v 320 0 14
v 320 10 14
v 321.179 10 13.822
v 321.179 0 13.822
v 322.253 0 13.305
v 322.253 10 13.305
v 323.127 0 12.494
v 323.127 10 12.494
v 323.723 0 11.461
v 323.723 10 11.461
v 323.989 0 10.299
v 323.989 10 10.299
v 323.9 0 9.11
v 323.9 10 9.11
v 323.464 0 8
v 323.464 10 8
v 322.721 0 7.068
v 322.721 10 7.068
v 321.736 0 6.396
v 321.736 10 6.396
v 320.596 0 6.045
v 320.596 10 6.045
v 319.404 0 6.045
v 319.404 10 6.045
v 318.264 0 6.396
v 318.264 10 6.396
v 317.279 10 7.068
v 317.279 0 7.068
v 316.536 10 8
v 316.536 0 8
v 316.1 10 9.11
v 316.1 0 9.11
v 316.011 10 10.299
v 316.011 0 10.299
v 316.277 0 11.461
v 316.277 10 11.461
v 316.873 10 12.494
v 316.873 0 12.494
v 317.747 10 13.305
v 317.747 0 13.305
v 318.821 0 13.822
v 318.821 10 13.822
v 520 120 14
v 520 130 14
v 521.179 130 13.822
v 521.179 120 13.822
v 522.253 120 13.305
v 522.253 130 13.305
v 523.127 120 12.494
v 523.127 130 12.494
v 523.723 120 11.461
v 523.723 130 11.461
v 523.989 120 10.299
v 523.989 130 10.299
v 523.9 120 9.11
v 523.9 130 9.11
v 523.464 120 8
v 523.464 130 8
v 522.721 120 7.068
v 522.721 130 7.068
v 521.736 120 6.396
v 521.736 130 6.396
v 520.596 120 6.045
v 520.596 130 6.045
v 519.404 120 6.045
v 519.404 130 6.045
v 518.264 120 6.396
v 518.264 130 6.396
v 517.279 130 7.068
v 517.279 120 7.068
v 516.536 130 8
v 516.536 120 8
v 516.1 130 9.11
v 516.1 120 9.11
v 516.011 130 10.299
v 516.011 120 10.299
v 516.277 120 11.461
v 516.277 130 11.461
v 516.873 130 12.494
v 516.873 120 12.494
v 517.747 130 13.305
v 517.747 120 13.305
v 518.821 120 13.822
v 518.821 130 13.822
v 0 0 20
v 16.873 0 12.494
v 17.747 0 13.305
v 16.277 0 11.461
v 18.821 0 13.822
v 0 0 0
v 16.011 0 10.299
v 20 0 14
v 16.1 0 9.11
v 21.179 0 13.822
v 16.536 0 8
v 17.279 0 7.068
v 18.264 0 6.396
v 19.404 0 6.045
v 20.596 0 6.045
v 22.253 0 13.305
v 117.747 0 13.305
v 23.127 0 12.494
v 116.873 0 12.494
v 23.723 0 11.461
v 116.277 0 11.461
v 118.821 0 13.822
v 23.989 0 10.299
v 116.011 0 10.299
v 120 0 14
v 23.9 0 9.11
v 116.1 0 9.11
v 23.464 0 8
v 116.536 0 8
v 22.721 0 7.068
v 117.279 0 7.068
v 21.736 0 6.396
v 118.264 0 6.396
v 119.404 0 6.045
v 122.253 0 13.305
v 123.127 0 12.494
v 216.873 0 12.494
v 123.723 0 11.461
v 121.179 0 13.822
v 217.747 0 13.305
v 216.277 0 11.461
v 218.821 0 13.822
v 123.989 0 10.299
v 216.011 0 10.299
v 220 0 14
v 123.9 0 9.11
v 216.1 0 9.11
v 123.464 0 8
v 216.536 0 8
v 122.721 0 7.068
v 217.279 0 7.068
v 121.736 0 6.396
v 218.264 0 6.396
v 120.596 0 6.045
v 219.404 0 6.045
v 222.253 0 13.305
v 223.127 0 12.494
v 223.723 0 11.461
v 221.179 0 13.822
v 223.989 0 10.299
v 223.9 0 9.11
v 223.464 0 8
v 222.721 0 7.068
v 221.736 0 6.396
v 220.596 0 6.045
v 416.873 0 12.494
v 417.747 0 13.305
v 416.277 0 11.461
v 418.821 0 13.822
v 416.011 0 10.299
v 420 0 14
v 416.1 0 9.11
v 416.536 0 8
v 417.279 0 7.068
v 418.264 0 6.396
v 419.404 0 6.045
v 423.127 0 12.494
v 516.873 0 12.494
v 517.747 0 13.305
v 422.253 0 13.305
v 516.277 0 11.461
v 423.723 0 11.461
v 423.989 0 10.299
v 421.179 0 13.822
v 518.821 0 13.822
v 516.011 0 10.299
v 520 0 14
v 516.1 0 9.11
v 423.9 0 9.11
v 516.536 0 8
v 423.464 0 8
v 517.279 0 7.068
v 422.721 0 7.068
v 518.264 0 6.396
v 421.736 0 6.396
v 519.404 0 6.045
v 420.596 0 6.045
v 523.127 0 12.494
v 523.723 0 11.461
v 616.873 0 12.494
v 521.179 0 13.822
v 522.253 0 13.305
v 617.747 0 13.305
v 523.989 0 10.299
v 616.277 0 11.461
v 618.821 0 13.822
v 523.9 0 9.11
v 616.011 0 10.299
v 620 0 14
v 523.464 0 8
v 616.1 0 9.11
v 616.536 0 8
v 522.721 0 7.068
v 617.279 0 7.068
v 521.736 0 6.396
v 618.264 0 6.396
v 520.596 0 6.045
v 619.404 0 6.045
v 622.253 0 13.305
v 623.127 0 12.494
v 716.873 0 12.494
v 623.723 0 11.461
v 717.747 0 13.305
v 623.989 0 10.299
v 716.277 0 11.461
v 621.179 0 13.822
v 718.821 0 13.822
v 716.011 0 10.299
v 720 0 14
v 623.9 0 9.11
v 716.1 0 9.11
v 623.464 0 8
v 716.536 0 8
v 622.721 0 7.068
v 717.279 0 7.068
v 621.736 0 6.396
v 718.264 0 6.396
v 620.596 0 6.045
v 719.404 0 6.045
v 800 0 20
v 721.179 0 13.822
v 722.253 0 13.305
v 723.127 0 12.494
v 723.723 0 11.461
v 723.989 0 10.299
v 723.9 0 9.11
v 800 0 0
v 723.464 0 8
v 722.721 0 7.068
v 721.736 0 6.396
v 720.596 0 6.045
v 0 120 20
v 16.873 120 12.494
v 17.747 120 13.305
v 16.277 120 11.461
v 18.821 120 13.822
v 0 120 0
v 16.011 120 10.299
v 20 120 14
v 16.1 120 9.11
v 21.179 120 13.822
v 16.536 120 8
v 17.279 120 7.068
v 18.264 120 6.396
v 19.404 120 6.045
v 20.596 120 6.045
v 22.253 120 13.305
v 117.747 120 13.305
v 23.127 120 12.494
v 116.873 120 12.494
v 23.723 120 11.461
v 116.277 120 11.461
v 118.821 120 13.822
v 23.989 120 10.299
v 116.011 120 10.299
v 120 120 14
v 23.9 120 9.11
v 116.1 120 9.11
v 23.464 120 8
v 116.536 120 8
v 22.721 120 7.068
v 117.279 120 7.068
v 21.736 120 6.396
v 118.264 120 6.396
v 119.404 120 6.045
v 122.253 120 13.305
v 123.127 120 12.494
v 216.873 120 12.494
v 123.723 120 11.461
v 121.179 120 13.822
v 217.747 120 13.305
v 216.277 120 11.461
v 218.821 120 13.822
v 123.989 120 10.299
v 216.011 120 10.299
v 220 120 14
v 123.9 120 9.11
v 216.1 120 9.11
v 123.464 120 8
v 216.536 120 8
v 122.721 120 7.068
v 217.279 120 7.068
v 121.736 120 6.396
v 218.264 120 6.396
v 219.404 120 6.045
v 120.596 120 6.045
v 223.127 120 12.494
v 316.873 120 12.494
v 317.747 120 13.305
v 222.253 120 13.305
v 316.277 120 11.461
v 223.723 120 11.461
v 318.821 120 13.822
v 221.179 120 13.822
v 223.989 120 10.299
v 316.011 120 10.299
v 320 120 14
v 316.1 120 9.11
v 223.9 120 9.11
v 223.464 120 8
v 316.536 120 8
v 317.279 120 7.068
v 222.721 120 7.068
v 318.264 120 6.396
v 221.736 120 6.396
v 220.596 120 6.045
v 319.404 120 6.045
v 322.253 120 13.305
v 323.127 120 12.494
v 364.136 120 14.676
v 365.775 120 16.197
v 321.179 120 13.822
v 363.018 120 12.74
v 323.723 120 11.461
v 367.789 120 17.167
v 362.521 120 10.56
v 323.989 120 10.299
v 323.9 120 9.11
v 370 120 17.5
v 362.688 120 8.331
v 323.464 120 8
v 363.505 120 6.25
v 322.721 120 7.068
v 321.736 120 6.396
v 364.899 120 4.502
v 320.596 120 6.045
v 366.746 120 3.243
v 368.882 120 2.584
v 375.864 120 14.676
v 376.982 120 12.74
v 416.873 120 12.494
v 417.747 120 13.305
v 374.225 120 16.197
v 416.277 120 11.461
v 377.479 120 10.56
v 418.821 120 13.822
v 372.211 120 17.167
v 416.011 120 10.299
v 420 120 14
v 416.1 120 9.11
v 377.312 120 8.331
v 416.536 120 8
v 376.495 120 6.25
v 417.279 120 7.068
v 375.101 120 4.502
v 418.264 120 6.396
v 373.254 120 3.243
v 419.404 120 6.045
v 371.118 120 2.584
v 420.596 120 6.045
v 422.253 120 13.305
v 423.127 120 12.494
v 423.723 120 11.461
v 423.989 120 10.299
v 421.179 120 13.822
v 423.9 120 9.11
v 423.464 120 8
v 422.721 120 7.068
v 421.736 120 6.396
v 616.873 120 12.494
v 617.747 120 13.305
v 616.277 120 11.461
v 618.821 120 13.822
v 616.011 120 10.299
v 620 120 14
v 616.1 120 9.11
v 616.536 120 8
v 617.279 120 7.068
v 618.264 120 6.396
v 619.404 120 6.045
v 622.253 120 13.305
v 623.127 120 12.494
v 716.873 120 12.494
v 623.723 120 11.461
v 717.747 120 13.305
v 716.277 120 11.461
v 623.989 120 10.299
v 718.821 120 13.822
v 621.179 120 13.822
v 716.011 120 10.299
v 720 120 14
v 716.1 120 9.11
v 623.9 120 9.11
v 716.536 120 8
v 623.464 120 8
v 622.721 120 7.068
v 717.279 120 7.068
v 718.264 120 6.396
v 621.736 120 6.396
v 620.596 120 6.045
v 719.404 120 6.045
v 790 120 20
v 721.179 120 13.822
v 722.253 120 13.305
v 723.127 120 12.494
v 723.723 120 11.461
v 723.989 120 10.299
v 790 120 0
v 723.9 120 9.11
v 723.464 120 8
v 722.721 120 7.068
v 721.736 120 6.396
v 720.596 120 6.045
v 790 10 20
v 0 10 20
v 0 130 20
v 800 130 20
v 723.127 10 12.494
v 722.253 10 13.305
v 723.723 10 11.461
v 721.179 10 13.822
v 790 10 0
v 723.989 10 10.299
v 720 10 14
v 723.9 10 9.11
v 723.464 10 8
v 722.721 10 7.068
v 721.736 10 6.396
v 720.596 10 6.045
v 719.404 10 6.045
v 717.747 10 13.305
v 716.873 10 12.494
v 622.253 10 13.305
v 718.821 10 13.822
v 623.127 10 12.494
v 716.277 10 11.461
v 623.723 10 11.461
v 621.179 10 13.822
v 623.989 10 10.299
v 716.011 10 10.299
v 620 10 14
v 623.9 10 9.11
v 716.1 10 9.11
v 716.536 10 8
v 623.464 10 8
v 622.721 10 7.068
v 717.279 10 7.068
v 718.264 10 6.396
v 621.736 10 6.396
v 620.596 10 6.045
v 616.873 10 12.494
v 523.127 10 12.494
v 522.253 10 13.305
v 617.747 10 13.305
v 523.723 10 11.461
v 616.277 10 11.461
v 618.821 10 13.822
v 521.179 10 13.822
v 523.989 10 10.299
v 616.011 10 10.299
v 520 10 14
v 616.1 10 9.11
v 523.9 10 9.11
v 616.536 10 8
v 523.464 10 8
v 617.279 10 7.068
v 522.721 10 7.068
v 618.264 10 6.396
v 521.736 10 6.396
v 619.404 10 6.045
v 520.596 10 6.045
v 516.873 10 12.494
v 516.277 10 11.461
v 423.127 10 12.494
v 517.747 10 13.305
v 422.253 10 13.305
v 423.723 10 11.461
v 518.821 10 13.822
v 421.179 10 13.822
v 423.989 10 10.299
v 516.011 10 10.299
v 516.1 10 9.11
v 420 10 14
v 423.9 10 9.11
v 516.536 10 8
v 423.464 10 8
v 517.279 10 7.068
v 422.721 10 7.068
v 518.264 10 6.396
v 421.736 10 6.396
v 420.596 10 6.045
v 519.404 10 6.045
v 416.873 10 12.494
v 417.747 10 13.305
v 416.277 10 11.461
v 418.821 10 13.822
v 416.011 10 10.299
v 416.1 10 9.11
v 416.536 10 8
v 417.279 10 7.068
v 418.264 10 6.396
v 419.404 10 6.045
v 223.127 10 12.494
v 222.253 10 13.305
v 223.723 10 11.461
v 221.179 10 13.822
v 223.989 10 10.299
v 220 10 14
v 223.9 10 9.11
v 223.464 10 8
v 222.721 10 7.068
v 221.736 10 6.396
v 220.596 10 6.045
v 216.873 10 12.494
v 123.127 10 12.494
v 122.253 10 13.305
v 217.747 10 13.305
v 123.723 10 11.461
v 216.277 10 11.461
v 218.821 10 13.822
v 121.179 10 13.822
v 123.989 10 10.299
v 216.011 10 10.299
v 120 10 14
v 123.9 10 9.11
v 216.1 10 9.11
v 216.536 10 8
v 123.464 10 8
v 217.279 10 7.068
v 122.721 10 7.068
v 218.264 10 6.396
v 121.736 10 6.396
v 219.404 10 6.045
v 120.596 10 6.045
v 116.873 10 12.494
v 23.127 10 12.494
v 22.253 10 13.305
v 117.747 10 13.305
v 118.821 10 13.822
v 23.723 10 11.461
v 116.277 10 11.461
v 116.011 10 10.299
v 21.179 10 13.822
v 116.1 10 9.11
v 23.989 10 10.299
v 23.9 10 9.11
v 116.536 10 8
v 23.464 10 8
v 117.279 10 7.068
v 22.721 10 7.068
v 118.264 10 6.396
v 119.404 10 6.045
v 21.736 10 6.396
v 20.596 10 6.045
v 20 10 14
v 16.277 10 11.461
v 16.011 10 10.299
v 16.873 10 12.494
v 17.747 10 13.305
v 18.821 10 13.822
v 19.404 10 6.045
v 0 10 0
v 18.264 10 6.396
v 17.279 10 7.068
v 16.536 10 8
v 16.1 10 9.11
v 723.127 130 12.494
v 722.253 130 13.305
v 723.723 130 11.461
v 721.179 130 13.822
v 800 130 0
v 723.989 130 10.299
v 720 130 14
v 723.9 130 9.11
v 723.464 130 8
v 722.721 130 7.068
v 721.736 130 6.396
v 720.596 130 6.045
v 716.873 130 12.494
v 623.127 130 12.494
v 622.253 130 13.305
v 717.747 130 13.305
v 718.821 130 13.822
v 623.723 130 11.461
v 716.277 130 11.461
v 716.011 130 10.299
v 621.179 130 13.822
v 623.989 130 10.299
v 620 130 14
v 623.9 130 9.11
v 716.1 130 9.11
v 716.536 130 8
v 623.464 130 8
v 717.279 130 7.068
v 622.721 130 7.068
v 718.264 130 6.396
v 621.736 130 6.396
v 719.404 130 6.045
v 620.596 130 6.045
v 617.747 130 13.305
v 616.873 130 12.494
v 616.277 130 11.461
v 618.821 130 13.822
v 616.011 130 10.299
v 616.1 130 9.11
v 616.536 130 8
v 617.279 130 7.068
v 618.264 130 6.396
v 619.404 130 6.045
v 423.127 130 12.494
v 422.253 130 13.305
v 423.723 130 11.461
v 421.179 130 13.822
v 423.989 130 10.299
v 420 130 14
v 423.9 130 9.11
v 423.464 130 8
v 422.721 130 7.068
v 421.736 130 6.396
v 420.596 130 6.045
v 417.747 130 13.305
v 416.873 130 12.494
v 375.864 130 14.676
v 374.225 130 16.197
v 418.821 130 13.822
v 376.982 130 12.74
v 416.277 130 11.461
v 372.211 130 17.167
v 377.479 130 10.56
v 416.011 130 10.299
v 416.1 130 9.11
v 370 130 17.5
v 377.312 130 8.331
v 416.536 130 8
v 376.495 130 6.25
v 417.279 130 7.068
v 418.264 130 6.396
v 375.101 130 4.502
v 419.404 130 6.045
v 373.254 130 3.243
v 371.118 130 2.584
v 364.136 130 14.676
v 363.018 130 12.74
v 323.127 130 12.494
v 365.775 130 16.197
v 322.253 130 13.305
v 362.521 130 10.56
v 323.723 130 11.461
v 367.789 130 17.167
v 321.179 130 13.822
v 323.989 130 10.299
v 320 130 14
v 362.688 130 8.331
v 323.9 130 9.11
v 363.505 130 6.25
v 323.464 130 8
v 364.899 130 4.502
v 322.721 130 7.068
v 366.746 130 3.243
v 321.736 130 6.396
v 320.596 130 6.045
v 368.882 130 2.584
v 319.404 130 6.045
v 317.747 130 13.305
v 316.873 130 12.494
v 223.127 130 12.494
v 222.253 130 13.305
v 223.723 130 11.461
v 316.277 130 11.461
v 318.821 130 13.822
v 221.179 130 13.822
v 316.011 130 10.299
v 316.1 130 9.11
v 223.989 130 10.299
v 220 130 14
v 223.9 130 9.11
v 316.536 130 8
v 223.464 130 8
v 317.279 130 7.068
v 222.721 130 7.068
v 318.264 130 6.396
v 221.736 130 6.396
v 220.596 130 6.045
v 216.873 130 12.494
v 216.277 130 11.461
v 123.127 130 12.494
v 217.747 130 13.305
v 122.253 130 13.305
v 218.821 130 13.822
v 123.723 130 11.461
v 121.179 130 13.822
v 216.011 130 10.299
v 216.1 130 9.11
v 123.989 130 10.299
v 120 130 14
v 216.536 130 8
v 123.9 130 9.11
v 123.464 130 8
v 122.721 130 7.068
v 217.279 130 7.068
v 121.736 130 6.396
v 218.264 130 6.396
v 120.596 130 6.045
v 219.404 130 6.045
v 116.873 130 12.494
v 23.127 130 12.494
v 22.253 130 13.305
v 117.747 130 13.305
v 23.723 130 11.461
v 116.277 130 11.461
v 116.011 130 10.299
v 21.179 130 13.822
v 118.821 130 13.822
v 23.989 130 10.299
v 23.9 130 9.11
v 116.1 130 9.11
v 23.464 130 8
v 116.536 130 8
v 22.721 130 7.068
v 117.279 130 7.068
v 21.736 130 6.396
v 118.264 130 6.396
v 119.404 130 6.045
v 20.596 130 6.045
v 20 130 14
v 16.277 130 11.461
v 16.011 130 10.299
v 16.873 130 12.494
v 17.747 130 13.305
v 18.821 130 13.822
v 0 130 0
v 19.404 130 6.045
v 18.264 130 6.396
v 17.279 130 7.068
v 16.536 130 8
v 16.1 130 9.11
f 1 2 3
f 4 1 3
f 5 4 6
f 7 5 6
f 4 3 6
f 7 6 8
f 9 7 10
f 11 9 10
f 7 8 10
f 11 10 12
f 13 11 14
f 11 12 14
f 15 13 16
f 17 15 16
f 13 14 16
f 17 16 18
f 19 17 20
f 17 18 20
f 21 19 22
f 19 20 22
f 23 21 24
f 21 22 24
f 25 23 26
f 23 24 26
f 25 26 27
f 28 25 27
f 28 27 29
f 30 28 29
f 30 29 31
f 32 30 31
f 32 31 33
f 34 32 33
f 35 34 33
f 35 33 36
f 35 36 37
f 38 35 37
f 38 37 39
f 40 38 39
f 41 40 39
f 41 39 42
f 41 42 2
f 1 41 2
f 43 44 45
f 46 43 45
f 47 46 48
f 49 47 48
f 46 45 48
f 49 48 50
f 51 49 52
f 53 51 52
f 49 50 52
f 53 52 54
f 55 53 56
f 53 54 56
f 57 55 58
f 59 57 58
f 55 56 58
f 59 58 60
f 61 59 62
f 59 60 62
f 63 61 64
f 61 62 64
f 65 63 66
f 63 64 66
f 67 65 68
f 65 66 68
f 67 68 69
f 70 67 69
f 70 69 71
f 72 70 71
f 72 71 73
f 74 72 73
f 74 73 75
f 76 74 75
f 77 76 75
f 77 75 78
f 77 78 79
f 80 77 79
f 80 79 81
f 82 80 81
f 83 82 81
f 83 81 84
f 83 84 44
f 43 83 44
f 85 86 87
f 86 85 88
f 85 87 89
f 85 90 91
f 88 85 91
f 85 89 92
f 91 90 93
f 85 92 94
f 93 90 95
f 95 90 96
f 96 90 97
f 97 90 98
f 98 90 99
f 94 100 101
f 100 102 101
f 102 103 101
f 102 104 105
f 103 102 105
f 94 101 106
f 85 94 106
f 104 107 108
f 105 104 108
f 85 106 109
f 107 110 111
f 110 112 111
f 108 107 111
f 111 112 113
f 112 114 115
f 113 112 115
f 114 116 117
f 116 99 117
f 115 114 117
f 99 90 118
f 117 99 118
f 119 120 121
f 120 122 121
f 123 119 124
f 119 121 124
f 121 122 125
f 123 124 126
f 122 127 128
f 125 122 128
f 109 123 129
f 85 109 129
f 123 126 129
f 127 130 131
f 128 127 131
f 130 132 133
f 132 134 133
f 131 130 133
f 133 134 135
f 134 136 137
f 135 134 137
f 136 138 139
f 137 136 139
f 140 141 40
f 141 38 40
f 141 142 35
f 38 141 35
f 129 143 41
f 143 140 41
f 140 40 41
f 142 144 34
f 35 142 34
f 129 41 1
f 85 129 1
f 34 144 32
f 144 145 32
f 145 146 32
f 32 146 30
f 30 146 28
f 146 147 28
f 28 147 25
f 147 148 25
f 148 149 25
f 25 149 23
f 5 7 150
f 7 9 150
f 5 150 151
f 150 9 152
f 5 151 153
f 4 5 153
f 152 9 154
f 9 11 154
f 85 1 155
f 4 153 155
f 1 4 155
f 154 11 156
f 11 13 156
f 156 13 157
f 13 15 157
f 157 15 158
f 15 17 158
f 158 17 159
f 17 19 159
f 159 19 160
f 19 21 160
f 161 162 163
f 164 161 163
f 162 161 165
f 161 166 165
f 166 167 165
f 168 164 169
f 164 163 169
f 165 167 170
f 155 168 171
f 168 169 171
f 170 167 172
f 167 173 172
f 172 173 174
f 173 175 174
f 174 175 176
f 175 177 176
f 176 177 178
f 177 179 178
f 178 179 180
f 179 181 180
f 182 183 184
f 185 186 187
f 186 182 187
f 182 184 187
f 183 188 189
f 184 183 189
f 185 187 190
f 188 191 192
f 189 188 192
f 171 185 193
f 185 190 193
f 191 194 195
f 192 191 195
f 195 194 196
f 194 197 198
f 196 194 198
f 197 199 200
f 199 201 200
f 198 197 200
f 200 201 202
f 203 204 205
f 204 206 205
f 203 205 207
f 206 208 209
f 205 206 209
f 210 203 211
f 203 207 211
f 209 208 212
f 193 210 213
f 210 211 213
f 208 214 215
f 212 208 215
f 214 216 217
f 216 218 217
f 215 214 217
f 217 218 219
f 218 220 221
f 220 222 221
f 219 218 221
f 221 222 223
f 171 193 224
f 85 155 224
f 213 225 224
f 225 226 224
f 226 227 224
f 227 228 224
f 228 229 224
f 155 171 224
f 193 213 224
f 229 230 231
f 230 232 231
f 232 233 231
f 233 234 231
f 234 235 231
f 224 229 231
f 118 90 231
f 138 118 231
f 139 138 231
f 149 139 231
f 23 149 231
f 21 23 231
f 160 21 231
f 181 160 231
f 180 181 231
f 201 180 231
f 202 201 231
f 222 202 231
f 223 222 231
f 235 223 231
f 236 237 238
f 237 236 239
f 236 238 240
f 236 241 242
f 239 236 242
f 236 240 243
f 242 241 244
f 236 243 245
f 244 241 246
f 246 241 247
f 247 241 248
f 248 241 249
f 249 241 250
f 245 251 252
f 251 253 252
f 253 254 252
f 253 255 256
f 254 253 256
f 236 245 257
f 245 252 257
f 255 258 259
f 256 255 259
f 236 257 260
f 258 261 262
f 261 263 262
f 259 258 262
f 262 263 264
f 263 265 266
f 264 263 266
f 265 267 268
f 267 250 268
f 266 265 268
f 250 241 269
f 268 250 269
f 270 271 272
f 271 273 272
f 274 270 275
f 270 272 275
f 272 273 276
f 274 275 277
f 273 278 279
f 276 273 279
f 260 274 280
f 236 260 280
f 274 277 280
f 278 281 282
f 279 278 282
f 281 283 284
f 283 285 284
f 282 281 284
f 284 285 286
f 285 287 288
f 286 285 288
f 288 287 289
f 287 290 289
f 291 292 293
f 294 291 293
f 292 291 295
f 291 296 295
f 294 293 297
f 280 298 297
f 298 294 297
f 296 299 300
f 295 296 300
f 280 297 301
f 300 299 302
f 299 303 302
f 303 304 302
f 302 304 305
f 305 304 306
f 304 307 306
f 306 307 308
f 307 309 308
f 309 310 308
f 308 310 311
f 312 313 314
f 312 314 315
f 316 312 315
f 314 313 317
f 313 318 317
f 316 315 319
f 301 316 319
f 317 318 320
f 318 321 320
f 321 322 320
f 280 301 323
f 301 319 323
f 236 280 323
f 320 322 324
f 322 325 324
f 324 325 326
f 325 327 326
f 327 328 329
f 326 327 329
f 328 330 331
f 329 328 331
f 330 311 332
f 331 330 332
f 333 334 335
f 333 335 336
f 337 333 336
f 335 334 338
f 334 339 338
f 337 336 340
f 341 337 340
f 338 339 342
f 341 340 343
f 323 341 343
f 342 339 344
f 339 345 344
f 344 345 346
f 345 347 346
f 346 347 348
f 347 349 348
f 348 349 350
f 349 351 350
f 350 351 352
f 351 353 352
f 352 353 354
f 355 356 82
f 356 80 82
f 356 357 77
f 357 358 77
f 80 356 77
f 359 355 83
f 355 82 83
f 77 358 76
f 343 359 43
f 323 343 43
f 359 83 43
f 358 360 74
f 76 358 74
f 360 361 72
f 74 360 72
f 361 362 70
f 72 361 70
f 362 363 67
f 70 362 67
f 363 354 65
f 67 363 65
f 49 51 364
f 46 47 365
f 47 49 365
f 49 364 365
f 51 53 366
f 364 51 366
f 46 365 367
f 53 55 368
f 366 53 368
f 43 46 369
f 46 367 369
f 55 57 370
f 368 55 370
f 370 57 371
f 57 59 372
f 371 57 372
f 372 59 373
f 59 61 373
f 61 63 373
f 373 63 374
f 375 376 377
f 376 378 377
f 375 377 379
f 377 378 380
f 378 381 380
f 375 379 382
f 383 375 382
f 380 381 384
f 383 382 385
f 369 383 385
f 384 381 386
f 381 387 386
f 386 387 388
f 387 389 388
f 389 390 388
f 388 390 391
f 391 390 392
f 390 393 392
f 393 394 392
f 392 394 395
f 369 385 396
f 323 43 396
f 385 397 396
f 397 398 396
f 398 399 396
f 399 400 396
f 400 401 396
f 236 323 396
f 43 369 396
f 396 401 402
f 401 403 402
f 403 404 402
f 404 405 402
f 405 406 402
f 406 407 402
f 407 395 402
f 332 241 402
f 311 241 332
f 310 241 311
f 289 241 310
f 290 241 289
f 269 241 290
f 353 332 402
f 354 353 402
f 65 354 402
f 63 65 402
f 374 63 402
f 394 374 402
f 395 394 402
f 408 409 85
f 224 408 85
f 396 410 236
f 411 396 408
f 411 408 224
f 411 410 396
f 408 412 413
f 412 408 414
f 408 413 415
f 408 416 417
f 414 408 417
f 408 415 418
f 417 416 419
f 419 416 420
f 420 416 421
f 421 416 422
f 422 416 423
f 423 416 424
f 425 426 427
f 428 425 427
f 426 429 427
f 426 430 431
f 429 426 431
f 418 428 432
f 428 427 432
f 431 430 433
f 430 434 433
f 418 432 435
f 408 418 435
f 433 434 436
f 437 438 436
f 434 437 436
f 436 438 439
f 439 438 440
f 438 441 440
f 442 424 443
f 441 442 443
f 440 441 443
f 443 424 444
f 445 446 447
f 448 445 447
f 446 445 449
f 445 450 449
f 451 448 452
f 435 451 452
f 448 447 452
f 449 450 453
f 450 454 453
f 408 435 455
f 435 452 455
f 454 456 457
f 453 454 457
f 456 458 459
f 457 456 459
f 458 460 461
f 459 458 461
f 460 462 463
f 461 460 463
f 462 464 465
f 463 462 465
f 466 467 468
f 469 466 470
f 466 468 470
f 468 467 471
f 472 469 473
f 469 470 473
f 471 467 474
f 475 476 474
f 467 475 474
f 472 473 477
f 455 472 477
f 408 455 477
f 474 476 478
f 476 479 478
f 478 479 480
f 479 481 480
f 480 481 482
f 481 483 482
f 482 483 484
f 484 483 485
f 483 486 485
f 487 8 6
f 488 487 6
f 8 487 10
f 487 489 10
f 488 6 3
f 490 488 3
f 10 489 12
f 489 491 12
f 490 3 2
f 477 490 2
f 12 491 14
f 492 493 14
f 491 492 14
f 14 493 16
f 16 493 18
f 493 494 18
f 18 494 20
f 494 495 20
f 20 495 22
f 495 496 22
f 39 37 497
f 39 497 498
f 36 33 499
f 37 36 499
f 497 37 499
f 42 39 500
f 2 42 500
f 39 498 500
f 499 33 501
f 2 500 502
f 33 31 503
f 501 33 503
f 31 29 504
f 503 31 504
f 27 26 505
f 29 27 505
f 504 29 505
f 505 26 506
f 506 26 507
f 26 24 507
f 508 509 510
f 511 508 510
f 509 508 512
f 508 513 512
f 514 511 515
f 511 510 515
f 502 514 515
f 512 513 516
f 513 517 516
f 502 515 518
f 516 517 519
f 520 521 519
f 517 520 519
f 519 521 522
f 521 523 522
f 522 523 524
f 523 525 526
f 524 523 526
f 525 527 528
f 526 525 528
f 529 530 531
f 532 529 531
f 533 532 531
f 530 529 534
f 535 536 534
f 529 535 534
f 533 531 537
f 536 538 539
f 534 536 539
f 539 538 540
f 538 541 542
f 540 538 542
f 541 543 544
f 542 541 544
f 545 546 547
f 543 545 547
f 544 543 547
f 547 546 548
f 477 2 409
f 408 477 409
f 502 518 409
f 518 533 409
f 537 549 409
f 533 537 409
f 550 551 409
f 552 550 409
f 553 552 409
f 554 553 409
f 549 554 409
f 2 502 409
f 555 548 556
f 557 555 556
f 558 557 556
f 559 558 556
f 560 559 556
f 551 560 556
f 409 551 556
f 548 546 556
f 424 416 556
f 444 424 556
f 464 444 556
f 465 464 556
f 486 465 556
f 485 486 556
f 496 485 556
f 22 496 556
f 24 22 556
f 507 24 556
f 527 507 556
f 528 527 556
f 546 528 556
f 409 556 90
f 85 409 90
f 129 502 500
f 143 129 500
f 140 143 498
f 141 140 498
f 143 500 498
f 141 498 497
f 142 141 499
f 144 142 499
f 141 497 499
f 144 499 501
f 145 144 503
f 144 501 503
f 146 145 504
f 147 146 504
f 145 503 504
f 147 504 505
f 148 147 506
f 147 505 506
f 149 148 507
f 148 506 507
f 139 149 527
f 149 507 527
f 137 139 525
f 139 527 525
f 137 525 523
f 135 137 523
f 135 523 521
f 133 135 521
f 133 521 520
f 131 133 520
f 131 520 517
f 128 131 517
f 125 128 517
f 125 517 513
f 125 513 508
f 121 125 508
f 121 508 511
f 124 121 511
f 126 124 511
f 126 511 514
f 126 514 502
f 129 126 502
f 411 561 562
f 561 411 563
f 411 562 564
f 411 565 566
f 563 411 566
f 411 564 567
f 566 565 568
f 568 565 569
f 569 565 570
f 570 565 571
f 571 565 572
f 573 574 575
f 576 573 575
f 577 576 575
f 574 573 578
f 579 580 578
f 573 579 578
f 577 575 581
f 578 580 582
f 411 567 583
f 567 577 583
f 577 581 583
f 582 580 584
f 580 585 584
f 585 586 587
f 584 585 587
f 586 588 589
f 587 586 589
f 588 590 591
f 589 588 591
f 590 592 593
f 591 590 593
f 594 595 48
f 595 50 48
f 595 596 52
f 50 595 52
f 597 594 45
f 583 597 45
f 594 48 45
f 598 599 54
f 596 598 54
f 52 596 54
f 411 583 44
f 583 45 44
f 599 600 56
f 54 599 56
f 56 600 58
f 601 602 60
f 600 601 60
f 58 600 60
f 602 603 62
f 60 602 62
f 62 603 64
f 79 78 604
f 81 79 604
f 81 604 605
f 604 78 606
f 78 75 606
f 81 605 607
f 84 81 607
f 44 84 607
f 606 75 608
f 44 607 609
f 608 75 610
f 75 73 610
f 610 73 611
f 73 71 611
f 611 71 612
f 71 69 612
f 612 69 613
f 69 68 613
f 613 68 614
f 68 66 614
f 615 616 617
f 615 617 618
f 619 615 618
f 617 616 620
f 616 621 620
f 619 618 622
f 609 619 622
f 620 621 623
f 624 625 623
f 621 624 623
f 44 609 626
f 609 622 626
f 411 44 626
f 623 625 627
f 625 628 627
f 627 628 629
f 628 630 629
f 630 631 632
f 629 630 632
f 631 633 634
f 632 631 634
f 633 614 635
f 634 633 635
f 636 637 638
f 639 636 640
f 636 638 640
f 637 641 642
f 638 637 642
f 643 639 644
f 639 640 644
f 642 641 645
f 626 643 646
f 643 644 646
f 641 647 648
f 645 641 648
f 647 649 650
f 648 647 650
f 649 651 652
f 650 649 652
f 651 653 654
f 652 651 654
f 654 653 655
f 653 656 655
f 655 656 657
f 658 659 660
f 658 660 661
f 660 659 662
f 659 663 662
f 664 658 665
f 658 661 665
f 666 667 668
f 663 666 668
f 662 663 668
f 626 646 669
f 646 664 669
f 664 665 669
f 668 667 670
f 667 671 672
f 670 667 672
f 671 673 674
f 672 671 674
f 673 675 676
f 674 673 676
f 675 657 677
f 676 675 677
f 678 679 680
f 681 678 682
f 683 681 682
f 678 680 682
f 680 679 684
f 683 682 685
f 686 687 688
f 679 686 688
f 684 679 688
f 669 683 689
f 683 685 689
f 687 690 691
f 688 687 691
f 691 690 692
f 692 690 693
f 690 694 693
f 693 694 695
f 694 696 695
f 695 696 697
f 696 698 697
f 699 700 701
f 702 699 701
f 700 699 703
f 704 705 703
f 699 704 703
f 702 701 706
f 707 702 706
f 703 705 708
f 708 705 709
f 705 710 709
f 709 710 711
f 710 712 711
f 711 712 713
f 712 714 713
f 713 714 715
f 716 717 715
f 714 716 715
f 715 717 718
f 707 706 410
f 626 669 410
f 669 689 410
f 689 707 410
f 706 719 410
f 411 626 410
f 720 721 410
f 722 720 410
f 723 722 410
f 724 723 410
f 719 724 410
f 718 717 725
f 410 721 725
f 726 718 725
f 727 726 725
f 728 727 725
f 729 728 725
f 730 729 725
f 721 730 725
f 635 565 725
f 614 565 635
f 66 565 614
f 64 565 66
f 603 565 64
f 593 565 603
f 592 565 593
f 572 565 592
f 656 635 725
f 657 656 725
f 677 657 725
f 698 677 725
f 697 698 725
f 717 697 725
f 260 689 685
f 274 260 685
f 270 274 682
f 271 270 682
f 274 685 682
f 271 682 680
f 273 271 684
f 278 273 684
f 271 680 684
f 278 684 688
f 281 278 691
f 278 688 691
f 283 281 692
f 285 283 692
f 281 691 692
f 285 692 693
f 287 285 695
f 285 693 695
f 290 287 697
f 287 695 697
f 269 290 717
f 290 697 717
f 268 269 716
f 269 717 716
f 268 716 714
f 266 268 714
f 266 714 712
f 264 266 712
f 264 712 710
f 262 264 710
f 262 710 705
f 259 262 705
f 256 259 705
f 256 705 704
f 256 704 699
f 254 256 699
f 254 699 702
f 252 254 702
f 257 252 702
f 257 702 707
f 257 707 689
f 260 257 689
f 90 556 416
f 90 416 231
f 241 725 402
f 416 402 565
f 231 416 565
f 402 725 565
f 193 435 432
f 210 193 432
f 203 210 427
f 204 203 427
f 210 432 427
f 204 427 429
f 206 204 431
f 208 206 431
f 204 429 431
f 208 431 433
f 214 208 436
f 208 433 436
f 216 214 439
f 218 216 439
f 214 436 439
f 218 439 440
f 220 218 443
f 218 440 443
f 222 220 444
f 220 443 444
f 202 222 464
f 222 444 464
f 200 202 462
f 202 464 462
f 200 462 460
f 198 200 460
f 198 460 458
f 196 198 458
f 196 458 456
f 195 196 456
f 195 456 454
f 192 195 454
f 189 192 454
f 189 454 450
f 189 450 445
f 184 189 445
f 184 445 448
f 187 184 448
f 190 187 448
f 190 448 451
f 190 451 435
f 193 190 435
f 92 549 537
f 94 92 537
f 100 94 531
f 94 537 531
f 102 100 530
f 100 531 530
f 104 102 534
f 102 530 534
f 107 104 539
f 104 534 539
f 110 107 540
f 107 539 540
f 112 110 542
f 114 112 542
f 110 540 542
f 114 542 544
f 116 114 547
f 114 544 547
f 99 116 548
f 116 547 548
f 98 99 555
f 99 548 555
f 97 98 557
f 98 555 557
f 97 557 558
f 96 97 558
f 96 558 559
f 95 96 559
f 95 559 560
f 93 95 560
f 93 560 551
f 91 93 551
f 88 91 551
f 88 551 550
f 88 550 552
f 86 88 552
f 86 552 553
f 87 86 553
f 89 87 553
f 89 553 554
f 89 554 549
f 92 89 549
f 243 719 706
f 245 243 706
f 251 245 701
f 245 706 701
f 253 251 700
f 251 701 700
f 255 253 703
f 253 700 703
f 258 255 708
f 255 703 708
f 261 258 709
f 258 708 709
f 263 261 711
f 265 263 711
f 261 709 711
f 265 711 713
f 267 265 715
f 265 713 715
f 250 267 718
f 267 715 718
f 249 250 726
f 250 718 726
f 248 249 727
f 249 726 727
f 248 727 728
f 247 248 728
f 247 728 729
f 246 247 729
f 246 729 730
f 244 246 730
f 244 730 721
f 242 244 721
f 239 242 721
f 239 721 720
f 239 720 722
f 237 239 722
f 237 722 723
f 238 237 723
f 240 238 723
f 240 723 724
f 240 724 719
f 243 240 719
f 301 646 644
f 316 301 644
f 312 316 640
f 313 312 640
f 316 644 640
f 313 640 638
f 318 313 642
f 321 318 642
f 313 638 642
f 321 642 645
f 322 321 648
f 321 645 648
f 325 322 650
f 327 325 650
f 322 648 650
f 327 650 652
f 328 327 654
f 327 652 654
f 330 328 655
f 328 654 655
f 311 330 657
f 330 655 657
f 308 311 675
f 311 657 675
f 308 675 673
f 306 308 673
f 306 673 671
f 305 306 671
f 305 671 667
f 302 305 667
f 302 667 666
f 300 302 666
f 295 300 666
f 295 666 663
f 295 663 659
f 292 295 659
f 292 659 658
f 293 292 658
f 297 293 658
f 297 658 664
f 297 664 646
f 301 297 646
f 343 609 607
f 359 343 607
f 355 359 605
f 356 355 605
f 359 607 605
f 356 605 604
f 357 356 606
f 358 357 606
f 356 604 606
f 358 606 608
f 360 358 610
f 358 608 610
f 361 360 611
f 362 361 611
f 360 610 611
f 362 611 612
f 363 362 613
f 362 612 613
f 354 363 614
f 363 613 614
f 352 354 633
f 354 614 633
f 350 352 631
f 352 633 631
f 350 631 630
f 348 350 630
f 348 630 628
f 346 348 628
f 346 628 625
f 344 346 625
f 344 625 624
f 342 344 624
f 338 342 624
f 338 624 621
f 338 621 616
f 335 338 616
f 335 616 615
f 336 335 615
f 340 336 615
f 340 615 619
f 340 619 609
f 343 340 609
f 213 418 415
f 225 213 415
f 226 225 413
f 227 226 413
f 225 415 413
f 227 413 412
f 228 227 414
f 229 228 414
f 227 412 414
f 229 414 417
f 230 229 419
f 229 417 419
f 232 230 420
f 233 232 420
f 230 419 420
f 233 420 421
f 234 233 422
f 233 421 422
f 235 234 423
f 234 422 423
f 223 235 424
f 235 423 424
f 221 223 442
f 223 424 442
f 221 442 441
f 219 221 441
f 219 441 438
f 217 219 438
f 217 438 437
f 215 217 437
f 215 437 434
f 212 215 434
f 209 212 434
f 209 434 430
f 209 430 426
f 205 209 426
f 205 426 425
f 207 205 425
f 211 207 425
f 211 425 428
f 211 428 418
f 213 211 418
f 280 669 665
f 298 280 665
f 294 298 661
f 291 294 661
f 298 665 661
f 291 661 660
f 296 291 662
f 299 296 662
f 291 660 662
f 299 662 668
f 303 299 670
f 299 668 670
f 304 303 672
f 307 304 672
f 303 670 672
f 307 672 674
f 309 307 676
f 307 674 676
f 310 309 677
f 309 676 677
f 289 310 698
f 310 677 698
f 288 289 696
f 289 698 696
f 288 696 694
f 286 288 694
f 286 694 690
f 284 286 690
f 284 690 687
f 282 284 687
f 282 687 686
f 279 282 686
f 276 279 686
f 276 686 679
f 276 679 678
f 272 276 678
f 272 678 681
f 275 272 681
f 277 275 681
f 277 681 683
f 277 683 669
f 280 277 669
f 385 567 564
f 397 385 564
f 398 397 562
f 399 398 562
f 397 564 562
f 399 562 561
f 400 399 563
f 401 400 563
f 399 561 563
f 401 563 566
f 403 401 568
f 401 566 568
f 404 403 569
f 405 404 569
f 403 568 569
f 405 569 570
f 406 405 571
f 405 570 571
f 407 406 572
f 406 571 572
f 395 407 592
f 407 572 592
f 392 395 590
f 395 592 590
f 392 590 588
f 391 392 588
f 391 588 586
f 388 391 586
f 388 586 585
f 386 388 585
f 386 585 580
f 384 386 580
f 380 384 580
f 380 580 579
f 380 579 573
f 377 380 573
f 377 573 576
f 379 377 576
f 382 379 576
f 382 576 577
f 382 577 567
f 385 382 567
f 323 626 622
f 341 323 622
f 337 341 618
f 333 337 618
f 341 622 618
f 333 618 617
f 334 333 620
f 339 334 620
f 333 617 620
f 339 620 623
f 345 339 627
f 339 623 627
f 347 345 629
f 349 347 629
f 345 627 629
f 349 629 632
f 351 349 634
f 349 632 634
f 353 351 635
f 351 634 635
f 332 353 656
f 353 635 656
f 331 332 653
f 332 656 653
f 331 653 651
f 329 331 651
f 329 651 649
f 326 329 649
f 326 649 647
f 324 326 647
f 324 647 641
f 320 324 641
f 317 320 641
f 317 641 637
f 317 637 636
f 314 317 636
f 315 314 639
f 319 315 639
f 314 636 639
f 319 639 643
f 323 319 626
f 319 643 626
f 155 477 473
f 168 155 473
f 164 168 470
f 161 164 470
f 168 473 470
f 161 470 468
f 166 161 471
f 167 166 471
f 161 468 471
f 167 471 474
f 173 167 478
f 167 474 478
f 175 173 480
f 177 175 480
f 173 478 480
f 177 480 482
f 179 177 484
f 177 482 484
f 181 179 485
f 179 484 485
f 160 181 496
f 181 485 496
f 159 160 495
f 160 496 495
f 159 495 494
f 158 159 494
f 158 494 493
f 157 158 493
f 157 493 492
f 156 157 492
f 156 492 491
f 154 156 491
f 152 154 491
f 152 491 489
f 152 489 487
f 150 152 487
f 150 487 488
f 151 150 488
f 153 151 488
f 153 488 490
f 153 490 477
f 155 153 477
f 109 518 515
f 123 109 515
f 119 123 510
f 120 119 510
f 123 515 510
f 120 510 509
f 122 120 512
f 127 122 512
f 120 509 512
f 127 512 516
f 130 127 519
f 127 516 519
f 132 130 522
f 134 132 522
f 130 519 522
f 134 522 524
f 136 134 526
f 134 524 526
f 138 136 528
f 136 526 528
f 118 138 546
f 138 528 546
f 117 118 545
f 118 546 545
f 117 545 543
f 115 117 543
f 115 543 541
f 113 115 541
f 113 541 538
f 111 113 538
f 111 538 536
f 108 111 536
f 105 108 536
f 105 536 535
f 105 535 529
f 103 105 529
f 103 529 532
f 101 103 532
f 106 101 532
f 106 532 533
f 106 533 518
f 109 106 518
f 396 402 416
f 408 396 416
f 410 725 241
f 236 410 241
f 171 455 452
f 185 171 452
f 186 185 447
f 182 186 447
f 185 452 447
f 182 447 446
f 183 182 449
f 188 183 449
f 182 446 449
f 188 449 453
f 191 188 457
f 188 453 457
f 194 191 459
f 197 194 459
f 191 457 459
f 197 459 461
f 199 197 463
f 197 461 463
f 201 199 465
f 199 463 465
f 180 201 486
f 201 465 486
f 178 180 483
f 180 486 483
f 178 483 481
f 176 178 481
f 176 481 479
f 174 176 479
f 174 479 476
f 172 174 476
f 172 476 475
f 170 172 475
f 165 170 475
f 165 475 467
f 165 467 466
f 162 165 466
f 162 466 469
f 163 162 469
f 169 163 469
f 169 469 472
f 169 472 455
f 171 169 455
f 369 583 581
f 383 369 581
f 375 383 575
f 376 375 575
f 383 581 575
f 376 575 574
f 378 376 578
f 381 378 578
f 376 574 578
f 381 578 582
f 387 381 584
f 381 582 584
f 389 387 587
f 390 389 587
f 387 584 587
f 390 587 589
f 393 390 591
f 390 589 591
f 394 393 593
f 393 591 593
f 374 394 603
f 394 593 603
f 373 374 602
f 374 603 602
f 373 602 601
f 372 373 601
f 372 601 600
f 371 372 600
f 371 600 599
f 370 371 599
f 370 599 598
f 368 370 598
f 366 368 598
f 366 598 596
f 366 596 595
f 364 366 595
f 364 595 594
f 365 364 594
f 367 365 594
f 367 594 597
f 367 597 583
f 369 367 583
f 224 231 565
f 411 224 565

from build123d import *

# Parameters (mm, degrees)
BOSS_EXTRU_1_DEPTH         = 20
ESQUISSE2_R                = 4
ENL_V_MAT_EXTRU_1_DEPTH    = 811.740402348
R_P_TITION_LIN_AIRE1_COUNT = 8
R_P_TITION_LIN_AIRE1_PITCH = 100
ESQUISSE3_R                = 7.5
ENL_V_MAT_EXTRU_2_DEPTH    = 10


with BuildPart() as part:
    # Esquisse1 → Boss.-Extru.1 (new body)
    with BuildSketch(Plane.XY):
        Polygon((0, 130), (0, 120), (790, 120), (790, 10), (0, 10), (0, 0), (800, 0), (800, 130), align=None)
    extrude(amount=BOSS_EXTRU_1_DEPTH)

    # Esquisse2 → Enlèv. mat.-Extru.1 (cut, through all)
    with BuildSketch(Plane(origin=(0, 130, 0), x_dir=(1, 0, 0), z_dir=(0, 1, 0))):
        with Locations(Location((20, -10, 0), (0, 0, 270))):
            Circle(ESQUISSE2_R)
    enl_v_mat_extru_1 = extrude(amount=-ENL_V_MAT_EXTRU_1_DEPTH, mode=Mode.SUBTRACT)

    # Répétition linéaire1: Enlèv. mat.-Extru.1 ×8
    with Locations(*[(i * R_P_TITION_LIN_AIRE1_PITCH, 0, 0) for i in range(1, R_P_TITION_LIN_AIRE1_COUNT)]):
        add(enl_v_mat_extru_1, mode=Mode.SUBTRACT)

    # Esquisse3 → Enlèv. mat.-Extru.2 (cut)
    with BuildSketch(Plane(origin=(0, 130, 0), x_dir=(1, 0, 0), z_dir=(0, 1, 0))):
        with Locations(Location((370, -10, 0), (0, 0, 270))):
            Circle(ESQUISSE3_R)
    extrude(amount=-ENL_V_MAT_EXTRU_2_DEPTH, mode=Mode.SUBTRACT)


solid = part.part
